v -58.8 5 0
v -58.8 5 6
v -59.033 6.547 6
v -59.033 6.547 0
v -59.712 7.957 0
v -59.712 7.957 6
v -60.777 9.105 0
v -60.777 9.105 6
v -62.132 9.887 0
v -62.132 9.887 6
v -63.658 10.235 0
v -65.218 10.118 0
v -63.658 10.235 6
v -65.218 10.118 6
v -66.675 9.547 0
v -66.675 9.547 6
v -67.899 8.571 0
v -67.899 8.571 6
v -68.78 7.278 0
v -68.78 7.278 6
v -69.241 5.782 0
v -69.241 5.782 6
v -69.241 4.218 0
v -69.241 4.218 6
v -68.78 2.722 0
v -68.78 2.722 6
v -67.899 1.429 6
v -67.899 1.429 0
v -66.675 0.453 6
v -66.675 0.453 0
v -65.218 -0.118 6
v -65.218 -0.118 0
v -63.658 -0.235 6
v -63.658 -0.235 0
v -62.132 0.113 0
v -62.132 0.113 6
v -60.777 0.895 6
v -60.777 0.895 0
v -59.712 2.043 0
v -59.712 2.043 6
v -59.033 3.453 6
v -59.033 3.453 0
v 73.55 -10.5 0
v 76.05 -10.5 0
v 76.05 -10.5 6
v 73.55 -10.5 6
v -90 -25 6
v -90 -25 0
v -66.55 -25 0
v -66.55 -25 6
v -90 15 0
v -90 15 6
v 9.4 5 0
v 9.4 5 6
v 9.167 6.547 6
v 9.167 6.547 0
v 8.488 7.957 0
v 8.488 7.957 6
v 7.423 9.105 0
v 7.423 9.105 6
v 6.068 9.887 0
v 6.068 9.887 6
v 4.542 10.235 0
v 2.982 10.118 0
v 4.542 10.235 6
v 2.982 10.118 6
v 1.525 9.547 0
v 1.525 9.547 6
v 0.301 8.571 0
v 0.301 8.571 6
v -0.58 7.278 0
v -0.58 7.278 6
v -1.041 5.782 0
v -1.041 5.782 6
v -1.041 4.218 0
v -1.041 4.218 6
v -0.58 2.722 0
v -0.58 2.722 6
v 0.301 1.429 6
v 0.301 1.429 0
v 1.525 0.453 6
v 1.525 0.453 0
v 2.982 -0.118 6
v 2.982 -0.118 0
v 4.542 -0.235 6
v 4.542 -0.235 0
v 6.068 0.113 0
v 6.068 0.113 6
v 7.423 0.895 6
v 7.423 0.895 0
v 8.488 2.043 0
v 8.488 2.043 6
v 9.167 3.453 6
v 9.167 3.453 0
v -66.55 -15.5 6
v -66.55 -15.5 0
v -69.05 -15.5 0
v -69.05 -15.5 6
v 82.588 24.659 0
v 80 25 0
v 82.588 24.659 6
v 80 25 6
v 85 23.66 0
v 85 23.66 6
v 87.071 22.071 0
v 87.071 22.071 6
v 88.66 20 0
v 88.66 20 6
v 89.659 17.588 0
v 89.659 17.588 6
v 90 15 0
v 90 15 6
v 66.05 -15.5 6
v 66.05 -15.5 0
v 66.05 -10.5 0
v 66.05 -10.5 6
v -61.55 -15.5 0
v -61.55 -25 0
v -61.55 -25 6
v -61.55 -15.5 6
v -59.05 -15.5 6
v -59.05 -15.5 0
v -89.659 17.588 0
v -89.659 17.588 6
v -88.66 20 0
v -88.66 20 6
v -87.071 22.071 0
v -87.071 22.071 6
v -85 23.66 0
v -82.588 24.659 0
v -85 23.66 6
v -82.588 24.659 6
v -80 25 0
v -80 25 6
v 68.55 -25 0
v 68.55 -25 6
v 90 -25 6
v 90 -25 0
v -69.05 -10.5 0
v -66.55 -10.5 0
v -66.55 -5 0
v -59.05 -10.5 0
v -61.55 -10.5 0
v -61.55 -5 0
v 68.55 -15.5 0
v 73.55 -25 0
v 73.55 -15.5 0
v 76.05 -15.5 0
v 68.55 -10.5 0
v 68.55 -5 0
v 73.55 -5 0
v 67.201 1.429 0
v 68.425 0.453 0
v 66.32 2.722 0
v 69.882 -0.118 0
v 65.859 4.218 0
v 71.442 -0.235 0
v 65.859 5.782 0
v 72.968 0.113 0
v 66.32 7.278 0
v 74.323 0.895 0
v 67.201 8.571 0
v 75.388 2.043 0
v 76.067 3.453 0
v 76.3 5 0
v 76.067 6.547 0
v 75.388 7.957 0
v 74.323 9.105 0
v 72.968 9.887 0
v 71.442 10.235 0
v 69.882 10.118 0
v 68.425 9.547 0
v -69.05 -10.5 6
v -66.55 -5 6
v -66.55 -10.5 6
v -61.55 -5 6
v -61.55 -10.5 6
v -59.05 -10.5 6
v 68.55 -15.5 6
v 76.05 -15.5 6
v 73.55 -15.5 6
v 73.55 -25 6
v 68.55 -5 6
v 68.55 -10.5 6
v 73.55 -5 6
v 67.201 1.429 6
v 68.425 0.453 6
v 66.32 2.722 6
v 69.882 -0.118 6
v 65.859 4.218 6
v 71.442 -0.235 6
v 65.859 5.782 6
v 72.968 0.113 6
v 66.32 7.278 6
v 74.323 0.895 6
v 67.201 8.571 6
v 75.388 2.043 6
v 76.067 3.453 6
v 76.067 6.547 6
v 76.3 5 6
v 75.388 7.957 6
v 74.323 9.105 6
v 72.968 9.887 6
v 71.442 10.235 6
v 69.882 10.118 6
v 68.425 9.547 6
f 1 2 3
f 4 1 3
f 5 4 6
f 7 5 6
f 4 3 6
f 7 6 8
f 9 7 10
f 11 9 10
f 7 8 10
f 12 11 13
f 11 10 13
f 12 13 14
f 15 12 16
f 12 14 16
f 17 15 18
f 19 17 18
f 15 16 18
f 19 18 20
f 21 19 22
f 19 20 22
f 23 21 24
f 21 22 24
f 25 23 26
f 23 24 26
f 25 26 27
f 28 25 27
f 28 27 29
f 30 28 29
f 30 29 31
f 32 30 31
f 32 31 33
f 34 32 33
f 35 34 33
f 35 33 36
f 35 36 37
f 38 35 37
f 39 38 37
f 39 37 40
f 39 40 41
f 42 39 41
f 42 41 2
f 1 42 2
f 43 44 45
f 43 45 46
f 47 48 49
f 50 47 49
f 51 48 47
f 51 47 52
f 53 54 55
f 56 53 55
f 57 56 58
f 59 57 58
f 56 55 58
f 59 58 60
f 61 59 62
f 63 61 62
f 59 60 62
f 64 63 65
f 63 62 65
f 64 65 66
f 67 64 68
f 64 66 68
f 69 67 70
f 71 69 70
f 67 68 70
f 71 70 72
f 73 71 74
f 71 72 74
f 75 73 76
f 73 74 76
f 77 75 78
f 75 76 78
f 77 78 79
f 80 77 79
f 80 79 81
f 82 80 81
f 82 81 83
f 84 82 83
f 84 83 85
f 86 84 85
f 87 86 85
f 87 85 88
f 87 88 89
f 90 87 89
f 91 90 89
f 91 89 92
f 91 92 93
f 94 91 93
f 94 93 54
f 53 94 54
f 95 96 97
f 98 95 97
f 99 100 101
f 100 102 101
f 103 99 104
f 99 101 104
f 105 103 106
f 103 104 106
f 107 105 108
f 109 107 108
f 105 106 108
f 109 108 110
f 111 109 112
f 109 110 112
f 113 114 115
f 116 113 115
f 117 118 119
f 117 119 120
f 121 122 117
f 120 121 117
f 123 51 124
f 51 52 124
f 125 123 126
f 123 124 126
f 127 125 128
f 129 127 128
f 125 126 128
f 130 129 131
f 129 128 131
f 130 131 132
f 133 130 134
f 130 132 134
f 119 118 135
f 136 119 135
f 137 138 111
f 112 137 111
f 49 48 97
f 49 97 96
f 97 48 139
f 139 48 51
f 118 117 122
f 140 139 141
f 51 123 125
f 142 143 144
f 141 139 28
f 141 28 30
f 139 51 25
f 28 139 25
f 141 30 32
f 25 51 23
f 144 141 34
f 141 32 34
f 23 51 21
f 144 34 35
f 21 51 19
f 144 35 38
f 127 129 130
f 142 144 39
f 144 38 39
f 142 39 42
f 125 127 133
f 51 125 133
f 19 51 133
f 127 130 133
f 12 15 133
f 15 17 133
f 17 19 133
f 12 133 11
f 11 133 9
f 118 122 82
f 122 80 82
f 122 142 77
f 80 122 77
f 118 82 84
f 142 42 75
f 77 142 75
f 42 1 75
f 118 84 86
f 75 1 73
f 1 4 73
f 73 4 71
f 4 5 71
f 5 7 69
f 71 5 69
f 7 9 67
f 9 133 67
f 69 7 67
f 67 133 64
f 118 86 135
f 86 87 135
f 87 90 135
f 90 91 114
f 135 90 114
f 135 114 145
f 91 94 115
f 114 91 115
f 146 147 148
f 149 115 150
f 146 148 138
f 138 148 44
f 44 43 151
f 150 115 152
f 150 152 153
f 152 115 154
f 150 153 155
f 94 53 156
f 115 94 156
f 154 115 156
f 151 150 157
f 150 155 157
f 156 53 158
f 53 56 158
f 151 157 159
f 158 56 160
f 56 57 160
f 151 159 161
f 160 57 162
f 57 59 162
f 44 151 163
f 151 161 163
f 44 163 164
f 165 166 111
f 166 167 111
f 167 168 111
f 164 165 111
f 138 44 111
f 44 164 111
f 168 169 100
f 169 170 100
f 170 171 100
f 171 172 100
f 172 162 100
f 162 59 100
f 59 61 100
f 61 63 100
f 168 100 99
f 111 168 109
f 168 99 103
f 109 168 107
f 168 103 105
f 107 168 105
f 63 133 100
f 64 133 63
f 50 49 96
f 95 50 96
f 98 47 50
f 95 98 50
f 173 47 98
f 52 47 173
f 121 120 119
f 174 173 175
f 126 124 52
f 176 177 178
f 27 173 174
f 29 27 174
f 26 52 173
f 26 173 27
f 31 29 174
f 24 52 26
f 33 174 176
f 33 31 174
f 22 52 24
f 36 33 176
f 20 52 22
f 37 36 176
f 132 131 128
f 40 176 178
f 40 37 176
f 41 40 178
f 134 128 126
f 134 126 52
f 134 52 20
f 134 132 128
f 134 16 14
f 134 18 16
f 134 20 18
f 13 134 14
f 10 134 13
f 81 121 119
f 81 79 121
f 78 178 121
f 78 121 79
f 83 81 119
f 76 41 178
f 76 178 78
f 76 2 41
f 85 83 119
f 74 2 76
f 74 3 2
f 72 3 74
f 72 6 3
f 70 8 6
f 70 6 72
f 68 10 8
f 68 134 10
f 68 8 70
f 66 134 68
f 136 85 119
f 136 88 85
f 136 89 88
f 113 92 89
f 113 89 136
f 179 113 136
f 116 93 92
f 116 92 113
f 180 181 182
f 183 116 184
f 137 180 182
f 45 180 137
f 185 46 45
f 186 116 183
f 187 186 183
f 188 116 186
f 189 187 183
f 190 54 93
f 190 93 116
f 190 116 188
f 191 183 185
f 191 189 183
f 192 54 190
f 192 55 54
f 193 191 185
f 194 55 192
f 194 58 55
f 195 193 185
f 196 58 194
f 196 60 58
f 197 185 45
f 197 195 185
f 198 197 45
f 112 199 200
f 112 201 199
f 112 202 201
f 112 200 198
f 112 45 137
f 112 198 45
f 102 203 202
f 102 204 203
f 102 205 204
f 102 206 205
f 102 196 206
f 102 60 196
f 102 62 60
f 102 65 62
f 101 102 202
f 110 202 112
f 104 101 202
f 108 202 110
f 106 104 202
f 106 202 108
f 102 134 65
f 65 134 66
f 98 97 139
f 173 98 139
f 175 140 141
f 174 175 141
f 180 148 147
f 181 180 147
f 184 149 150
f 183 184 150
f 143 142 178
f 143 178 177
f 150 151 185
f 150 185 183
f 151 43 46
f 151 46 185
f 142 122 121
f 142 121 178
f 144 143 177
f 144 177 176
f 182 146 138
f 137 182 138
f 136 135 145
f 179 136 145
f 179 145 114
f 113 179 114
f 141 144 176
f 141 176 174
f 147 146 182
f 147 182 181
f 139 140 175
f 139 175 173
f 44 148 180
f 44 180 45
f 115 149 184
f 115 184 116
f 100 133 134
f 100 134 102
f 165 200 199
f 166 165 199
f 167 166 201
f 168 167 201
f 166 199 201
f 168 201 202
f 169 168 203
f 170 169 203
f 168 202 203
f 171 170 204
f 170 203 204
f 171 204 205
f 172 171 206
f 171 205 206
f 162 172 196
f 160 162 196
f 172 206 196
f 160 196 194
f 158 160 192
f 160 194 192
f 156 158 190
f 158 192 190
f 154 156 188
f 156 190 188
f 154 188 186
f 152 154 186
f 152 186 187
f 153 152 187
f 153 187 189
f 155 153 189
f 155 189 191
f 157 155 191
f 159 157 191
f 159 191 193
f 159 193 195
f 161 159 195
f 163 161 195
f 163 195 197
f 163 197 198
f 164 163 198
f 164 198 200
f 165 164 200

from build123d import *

# Parameters (mm, degrees)
SKETCH1_W           = 180
SKETCH1_H           = 50
BOSS_EXTRUDE1_DEPTH = 6
SKETCH2_R           = 5.25
CUT_EXTRUDE1_DEPTH  = 7
FILLET1_R           = 10
SKETCH3_W           = 5
SKETCH3_H           = 20
SKETCH3_W_2         = 10
SKETCH3_H_2         = 5
CUT_EXTRUDE2_DEPTH  = 7


with BuildPart() as part:
    # Sketch1 → Boss-Extrude1 (new body)
    with BuildSketch(Plane.XY):
        Rectangle(SKETCH1_W, SKETCH1_H)
    extrude(amount=BOSS_EXTRUDE1_DEPTH)

    # Sketch2 → Cut-Extrude1 (cut, through all)
    with BuildSketch(Plane.XY.offset(6)):
        with Locations((-64.05, 5)):
            Circle(SKETCH2_R)
        with Locations((4.15, 5)):
            Circle(SKETCH2_R)
        with Locations((71.05, 5)):
            Circle(SKETCH2_R)
    extrude(amount=-CUT_EXTRUDE1_DEPTH, mode=Mode.SUBTRACT)

    # Fillet1
    fillet1_edges = [part.edges().sort_by_distance(p)[0] for p in [
        (-90, 25, 3),
        (90, 25, 3),
    ]]
    fillet(fillet1_edges, radius=FILLET1_R)

    # Sketch3 → Cut-Extrude2 (cut, through all)
    with BuildSketch(Plane(origin=(0, 0, 0), x_dir=(-1, 0, 0), z_dir=(0, 0, -1))):
        with Locations((-71.05, -15)):
            Rectangle(SKETCH3_W, SKETCH3_H)
        with Locations((64.05, -15)):
            Rectangle(SKETCH3_W, SKETCH3_H)
        with Locations((-71.05, -13)):
            Rectangle(SKETCH3_W_2, SKETCH3_H_2)
        with Locations((64.05, -13)):
            Rectangle(SKETCH3_W_2, SKETCH3_H_2)
    extrude(amount=-CUT_EXTRUDE2_DEPTH, mode=Mode.SUBTRACT)


solid = part.part
